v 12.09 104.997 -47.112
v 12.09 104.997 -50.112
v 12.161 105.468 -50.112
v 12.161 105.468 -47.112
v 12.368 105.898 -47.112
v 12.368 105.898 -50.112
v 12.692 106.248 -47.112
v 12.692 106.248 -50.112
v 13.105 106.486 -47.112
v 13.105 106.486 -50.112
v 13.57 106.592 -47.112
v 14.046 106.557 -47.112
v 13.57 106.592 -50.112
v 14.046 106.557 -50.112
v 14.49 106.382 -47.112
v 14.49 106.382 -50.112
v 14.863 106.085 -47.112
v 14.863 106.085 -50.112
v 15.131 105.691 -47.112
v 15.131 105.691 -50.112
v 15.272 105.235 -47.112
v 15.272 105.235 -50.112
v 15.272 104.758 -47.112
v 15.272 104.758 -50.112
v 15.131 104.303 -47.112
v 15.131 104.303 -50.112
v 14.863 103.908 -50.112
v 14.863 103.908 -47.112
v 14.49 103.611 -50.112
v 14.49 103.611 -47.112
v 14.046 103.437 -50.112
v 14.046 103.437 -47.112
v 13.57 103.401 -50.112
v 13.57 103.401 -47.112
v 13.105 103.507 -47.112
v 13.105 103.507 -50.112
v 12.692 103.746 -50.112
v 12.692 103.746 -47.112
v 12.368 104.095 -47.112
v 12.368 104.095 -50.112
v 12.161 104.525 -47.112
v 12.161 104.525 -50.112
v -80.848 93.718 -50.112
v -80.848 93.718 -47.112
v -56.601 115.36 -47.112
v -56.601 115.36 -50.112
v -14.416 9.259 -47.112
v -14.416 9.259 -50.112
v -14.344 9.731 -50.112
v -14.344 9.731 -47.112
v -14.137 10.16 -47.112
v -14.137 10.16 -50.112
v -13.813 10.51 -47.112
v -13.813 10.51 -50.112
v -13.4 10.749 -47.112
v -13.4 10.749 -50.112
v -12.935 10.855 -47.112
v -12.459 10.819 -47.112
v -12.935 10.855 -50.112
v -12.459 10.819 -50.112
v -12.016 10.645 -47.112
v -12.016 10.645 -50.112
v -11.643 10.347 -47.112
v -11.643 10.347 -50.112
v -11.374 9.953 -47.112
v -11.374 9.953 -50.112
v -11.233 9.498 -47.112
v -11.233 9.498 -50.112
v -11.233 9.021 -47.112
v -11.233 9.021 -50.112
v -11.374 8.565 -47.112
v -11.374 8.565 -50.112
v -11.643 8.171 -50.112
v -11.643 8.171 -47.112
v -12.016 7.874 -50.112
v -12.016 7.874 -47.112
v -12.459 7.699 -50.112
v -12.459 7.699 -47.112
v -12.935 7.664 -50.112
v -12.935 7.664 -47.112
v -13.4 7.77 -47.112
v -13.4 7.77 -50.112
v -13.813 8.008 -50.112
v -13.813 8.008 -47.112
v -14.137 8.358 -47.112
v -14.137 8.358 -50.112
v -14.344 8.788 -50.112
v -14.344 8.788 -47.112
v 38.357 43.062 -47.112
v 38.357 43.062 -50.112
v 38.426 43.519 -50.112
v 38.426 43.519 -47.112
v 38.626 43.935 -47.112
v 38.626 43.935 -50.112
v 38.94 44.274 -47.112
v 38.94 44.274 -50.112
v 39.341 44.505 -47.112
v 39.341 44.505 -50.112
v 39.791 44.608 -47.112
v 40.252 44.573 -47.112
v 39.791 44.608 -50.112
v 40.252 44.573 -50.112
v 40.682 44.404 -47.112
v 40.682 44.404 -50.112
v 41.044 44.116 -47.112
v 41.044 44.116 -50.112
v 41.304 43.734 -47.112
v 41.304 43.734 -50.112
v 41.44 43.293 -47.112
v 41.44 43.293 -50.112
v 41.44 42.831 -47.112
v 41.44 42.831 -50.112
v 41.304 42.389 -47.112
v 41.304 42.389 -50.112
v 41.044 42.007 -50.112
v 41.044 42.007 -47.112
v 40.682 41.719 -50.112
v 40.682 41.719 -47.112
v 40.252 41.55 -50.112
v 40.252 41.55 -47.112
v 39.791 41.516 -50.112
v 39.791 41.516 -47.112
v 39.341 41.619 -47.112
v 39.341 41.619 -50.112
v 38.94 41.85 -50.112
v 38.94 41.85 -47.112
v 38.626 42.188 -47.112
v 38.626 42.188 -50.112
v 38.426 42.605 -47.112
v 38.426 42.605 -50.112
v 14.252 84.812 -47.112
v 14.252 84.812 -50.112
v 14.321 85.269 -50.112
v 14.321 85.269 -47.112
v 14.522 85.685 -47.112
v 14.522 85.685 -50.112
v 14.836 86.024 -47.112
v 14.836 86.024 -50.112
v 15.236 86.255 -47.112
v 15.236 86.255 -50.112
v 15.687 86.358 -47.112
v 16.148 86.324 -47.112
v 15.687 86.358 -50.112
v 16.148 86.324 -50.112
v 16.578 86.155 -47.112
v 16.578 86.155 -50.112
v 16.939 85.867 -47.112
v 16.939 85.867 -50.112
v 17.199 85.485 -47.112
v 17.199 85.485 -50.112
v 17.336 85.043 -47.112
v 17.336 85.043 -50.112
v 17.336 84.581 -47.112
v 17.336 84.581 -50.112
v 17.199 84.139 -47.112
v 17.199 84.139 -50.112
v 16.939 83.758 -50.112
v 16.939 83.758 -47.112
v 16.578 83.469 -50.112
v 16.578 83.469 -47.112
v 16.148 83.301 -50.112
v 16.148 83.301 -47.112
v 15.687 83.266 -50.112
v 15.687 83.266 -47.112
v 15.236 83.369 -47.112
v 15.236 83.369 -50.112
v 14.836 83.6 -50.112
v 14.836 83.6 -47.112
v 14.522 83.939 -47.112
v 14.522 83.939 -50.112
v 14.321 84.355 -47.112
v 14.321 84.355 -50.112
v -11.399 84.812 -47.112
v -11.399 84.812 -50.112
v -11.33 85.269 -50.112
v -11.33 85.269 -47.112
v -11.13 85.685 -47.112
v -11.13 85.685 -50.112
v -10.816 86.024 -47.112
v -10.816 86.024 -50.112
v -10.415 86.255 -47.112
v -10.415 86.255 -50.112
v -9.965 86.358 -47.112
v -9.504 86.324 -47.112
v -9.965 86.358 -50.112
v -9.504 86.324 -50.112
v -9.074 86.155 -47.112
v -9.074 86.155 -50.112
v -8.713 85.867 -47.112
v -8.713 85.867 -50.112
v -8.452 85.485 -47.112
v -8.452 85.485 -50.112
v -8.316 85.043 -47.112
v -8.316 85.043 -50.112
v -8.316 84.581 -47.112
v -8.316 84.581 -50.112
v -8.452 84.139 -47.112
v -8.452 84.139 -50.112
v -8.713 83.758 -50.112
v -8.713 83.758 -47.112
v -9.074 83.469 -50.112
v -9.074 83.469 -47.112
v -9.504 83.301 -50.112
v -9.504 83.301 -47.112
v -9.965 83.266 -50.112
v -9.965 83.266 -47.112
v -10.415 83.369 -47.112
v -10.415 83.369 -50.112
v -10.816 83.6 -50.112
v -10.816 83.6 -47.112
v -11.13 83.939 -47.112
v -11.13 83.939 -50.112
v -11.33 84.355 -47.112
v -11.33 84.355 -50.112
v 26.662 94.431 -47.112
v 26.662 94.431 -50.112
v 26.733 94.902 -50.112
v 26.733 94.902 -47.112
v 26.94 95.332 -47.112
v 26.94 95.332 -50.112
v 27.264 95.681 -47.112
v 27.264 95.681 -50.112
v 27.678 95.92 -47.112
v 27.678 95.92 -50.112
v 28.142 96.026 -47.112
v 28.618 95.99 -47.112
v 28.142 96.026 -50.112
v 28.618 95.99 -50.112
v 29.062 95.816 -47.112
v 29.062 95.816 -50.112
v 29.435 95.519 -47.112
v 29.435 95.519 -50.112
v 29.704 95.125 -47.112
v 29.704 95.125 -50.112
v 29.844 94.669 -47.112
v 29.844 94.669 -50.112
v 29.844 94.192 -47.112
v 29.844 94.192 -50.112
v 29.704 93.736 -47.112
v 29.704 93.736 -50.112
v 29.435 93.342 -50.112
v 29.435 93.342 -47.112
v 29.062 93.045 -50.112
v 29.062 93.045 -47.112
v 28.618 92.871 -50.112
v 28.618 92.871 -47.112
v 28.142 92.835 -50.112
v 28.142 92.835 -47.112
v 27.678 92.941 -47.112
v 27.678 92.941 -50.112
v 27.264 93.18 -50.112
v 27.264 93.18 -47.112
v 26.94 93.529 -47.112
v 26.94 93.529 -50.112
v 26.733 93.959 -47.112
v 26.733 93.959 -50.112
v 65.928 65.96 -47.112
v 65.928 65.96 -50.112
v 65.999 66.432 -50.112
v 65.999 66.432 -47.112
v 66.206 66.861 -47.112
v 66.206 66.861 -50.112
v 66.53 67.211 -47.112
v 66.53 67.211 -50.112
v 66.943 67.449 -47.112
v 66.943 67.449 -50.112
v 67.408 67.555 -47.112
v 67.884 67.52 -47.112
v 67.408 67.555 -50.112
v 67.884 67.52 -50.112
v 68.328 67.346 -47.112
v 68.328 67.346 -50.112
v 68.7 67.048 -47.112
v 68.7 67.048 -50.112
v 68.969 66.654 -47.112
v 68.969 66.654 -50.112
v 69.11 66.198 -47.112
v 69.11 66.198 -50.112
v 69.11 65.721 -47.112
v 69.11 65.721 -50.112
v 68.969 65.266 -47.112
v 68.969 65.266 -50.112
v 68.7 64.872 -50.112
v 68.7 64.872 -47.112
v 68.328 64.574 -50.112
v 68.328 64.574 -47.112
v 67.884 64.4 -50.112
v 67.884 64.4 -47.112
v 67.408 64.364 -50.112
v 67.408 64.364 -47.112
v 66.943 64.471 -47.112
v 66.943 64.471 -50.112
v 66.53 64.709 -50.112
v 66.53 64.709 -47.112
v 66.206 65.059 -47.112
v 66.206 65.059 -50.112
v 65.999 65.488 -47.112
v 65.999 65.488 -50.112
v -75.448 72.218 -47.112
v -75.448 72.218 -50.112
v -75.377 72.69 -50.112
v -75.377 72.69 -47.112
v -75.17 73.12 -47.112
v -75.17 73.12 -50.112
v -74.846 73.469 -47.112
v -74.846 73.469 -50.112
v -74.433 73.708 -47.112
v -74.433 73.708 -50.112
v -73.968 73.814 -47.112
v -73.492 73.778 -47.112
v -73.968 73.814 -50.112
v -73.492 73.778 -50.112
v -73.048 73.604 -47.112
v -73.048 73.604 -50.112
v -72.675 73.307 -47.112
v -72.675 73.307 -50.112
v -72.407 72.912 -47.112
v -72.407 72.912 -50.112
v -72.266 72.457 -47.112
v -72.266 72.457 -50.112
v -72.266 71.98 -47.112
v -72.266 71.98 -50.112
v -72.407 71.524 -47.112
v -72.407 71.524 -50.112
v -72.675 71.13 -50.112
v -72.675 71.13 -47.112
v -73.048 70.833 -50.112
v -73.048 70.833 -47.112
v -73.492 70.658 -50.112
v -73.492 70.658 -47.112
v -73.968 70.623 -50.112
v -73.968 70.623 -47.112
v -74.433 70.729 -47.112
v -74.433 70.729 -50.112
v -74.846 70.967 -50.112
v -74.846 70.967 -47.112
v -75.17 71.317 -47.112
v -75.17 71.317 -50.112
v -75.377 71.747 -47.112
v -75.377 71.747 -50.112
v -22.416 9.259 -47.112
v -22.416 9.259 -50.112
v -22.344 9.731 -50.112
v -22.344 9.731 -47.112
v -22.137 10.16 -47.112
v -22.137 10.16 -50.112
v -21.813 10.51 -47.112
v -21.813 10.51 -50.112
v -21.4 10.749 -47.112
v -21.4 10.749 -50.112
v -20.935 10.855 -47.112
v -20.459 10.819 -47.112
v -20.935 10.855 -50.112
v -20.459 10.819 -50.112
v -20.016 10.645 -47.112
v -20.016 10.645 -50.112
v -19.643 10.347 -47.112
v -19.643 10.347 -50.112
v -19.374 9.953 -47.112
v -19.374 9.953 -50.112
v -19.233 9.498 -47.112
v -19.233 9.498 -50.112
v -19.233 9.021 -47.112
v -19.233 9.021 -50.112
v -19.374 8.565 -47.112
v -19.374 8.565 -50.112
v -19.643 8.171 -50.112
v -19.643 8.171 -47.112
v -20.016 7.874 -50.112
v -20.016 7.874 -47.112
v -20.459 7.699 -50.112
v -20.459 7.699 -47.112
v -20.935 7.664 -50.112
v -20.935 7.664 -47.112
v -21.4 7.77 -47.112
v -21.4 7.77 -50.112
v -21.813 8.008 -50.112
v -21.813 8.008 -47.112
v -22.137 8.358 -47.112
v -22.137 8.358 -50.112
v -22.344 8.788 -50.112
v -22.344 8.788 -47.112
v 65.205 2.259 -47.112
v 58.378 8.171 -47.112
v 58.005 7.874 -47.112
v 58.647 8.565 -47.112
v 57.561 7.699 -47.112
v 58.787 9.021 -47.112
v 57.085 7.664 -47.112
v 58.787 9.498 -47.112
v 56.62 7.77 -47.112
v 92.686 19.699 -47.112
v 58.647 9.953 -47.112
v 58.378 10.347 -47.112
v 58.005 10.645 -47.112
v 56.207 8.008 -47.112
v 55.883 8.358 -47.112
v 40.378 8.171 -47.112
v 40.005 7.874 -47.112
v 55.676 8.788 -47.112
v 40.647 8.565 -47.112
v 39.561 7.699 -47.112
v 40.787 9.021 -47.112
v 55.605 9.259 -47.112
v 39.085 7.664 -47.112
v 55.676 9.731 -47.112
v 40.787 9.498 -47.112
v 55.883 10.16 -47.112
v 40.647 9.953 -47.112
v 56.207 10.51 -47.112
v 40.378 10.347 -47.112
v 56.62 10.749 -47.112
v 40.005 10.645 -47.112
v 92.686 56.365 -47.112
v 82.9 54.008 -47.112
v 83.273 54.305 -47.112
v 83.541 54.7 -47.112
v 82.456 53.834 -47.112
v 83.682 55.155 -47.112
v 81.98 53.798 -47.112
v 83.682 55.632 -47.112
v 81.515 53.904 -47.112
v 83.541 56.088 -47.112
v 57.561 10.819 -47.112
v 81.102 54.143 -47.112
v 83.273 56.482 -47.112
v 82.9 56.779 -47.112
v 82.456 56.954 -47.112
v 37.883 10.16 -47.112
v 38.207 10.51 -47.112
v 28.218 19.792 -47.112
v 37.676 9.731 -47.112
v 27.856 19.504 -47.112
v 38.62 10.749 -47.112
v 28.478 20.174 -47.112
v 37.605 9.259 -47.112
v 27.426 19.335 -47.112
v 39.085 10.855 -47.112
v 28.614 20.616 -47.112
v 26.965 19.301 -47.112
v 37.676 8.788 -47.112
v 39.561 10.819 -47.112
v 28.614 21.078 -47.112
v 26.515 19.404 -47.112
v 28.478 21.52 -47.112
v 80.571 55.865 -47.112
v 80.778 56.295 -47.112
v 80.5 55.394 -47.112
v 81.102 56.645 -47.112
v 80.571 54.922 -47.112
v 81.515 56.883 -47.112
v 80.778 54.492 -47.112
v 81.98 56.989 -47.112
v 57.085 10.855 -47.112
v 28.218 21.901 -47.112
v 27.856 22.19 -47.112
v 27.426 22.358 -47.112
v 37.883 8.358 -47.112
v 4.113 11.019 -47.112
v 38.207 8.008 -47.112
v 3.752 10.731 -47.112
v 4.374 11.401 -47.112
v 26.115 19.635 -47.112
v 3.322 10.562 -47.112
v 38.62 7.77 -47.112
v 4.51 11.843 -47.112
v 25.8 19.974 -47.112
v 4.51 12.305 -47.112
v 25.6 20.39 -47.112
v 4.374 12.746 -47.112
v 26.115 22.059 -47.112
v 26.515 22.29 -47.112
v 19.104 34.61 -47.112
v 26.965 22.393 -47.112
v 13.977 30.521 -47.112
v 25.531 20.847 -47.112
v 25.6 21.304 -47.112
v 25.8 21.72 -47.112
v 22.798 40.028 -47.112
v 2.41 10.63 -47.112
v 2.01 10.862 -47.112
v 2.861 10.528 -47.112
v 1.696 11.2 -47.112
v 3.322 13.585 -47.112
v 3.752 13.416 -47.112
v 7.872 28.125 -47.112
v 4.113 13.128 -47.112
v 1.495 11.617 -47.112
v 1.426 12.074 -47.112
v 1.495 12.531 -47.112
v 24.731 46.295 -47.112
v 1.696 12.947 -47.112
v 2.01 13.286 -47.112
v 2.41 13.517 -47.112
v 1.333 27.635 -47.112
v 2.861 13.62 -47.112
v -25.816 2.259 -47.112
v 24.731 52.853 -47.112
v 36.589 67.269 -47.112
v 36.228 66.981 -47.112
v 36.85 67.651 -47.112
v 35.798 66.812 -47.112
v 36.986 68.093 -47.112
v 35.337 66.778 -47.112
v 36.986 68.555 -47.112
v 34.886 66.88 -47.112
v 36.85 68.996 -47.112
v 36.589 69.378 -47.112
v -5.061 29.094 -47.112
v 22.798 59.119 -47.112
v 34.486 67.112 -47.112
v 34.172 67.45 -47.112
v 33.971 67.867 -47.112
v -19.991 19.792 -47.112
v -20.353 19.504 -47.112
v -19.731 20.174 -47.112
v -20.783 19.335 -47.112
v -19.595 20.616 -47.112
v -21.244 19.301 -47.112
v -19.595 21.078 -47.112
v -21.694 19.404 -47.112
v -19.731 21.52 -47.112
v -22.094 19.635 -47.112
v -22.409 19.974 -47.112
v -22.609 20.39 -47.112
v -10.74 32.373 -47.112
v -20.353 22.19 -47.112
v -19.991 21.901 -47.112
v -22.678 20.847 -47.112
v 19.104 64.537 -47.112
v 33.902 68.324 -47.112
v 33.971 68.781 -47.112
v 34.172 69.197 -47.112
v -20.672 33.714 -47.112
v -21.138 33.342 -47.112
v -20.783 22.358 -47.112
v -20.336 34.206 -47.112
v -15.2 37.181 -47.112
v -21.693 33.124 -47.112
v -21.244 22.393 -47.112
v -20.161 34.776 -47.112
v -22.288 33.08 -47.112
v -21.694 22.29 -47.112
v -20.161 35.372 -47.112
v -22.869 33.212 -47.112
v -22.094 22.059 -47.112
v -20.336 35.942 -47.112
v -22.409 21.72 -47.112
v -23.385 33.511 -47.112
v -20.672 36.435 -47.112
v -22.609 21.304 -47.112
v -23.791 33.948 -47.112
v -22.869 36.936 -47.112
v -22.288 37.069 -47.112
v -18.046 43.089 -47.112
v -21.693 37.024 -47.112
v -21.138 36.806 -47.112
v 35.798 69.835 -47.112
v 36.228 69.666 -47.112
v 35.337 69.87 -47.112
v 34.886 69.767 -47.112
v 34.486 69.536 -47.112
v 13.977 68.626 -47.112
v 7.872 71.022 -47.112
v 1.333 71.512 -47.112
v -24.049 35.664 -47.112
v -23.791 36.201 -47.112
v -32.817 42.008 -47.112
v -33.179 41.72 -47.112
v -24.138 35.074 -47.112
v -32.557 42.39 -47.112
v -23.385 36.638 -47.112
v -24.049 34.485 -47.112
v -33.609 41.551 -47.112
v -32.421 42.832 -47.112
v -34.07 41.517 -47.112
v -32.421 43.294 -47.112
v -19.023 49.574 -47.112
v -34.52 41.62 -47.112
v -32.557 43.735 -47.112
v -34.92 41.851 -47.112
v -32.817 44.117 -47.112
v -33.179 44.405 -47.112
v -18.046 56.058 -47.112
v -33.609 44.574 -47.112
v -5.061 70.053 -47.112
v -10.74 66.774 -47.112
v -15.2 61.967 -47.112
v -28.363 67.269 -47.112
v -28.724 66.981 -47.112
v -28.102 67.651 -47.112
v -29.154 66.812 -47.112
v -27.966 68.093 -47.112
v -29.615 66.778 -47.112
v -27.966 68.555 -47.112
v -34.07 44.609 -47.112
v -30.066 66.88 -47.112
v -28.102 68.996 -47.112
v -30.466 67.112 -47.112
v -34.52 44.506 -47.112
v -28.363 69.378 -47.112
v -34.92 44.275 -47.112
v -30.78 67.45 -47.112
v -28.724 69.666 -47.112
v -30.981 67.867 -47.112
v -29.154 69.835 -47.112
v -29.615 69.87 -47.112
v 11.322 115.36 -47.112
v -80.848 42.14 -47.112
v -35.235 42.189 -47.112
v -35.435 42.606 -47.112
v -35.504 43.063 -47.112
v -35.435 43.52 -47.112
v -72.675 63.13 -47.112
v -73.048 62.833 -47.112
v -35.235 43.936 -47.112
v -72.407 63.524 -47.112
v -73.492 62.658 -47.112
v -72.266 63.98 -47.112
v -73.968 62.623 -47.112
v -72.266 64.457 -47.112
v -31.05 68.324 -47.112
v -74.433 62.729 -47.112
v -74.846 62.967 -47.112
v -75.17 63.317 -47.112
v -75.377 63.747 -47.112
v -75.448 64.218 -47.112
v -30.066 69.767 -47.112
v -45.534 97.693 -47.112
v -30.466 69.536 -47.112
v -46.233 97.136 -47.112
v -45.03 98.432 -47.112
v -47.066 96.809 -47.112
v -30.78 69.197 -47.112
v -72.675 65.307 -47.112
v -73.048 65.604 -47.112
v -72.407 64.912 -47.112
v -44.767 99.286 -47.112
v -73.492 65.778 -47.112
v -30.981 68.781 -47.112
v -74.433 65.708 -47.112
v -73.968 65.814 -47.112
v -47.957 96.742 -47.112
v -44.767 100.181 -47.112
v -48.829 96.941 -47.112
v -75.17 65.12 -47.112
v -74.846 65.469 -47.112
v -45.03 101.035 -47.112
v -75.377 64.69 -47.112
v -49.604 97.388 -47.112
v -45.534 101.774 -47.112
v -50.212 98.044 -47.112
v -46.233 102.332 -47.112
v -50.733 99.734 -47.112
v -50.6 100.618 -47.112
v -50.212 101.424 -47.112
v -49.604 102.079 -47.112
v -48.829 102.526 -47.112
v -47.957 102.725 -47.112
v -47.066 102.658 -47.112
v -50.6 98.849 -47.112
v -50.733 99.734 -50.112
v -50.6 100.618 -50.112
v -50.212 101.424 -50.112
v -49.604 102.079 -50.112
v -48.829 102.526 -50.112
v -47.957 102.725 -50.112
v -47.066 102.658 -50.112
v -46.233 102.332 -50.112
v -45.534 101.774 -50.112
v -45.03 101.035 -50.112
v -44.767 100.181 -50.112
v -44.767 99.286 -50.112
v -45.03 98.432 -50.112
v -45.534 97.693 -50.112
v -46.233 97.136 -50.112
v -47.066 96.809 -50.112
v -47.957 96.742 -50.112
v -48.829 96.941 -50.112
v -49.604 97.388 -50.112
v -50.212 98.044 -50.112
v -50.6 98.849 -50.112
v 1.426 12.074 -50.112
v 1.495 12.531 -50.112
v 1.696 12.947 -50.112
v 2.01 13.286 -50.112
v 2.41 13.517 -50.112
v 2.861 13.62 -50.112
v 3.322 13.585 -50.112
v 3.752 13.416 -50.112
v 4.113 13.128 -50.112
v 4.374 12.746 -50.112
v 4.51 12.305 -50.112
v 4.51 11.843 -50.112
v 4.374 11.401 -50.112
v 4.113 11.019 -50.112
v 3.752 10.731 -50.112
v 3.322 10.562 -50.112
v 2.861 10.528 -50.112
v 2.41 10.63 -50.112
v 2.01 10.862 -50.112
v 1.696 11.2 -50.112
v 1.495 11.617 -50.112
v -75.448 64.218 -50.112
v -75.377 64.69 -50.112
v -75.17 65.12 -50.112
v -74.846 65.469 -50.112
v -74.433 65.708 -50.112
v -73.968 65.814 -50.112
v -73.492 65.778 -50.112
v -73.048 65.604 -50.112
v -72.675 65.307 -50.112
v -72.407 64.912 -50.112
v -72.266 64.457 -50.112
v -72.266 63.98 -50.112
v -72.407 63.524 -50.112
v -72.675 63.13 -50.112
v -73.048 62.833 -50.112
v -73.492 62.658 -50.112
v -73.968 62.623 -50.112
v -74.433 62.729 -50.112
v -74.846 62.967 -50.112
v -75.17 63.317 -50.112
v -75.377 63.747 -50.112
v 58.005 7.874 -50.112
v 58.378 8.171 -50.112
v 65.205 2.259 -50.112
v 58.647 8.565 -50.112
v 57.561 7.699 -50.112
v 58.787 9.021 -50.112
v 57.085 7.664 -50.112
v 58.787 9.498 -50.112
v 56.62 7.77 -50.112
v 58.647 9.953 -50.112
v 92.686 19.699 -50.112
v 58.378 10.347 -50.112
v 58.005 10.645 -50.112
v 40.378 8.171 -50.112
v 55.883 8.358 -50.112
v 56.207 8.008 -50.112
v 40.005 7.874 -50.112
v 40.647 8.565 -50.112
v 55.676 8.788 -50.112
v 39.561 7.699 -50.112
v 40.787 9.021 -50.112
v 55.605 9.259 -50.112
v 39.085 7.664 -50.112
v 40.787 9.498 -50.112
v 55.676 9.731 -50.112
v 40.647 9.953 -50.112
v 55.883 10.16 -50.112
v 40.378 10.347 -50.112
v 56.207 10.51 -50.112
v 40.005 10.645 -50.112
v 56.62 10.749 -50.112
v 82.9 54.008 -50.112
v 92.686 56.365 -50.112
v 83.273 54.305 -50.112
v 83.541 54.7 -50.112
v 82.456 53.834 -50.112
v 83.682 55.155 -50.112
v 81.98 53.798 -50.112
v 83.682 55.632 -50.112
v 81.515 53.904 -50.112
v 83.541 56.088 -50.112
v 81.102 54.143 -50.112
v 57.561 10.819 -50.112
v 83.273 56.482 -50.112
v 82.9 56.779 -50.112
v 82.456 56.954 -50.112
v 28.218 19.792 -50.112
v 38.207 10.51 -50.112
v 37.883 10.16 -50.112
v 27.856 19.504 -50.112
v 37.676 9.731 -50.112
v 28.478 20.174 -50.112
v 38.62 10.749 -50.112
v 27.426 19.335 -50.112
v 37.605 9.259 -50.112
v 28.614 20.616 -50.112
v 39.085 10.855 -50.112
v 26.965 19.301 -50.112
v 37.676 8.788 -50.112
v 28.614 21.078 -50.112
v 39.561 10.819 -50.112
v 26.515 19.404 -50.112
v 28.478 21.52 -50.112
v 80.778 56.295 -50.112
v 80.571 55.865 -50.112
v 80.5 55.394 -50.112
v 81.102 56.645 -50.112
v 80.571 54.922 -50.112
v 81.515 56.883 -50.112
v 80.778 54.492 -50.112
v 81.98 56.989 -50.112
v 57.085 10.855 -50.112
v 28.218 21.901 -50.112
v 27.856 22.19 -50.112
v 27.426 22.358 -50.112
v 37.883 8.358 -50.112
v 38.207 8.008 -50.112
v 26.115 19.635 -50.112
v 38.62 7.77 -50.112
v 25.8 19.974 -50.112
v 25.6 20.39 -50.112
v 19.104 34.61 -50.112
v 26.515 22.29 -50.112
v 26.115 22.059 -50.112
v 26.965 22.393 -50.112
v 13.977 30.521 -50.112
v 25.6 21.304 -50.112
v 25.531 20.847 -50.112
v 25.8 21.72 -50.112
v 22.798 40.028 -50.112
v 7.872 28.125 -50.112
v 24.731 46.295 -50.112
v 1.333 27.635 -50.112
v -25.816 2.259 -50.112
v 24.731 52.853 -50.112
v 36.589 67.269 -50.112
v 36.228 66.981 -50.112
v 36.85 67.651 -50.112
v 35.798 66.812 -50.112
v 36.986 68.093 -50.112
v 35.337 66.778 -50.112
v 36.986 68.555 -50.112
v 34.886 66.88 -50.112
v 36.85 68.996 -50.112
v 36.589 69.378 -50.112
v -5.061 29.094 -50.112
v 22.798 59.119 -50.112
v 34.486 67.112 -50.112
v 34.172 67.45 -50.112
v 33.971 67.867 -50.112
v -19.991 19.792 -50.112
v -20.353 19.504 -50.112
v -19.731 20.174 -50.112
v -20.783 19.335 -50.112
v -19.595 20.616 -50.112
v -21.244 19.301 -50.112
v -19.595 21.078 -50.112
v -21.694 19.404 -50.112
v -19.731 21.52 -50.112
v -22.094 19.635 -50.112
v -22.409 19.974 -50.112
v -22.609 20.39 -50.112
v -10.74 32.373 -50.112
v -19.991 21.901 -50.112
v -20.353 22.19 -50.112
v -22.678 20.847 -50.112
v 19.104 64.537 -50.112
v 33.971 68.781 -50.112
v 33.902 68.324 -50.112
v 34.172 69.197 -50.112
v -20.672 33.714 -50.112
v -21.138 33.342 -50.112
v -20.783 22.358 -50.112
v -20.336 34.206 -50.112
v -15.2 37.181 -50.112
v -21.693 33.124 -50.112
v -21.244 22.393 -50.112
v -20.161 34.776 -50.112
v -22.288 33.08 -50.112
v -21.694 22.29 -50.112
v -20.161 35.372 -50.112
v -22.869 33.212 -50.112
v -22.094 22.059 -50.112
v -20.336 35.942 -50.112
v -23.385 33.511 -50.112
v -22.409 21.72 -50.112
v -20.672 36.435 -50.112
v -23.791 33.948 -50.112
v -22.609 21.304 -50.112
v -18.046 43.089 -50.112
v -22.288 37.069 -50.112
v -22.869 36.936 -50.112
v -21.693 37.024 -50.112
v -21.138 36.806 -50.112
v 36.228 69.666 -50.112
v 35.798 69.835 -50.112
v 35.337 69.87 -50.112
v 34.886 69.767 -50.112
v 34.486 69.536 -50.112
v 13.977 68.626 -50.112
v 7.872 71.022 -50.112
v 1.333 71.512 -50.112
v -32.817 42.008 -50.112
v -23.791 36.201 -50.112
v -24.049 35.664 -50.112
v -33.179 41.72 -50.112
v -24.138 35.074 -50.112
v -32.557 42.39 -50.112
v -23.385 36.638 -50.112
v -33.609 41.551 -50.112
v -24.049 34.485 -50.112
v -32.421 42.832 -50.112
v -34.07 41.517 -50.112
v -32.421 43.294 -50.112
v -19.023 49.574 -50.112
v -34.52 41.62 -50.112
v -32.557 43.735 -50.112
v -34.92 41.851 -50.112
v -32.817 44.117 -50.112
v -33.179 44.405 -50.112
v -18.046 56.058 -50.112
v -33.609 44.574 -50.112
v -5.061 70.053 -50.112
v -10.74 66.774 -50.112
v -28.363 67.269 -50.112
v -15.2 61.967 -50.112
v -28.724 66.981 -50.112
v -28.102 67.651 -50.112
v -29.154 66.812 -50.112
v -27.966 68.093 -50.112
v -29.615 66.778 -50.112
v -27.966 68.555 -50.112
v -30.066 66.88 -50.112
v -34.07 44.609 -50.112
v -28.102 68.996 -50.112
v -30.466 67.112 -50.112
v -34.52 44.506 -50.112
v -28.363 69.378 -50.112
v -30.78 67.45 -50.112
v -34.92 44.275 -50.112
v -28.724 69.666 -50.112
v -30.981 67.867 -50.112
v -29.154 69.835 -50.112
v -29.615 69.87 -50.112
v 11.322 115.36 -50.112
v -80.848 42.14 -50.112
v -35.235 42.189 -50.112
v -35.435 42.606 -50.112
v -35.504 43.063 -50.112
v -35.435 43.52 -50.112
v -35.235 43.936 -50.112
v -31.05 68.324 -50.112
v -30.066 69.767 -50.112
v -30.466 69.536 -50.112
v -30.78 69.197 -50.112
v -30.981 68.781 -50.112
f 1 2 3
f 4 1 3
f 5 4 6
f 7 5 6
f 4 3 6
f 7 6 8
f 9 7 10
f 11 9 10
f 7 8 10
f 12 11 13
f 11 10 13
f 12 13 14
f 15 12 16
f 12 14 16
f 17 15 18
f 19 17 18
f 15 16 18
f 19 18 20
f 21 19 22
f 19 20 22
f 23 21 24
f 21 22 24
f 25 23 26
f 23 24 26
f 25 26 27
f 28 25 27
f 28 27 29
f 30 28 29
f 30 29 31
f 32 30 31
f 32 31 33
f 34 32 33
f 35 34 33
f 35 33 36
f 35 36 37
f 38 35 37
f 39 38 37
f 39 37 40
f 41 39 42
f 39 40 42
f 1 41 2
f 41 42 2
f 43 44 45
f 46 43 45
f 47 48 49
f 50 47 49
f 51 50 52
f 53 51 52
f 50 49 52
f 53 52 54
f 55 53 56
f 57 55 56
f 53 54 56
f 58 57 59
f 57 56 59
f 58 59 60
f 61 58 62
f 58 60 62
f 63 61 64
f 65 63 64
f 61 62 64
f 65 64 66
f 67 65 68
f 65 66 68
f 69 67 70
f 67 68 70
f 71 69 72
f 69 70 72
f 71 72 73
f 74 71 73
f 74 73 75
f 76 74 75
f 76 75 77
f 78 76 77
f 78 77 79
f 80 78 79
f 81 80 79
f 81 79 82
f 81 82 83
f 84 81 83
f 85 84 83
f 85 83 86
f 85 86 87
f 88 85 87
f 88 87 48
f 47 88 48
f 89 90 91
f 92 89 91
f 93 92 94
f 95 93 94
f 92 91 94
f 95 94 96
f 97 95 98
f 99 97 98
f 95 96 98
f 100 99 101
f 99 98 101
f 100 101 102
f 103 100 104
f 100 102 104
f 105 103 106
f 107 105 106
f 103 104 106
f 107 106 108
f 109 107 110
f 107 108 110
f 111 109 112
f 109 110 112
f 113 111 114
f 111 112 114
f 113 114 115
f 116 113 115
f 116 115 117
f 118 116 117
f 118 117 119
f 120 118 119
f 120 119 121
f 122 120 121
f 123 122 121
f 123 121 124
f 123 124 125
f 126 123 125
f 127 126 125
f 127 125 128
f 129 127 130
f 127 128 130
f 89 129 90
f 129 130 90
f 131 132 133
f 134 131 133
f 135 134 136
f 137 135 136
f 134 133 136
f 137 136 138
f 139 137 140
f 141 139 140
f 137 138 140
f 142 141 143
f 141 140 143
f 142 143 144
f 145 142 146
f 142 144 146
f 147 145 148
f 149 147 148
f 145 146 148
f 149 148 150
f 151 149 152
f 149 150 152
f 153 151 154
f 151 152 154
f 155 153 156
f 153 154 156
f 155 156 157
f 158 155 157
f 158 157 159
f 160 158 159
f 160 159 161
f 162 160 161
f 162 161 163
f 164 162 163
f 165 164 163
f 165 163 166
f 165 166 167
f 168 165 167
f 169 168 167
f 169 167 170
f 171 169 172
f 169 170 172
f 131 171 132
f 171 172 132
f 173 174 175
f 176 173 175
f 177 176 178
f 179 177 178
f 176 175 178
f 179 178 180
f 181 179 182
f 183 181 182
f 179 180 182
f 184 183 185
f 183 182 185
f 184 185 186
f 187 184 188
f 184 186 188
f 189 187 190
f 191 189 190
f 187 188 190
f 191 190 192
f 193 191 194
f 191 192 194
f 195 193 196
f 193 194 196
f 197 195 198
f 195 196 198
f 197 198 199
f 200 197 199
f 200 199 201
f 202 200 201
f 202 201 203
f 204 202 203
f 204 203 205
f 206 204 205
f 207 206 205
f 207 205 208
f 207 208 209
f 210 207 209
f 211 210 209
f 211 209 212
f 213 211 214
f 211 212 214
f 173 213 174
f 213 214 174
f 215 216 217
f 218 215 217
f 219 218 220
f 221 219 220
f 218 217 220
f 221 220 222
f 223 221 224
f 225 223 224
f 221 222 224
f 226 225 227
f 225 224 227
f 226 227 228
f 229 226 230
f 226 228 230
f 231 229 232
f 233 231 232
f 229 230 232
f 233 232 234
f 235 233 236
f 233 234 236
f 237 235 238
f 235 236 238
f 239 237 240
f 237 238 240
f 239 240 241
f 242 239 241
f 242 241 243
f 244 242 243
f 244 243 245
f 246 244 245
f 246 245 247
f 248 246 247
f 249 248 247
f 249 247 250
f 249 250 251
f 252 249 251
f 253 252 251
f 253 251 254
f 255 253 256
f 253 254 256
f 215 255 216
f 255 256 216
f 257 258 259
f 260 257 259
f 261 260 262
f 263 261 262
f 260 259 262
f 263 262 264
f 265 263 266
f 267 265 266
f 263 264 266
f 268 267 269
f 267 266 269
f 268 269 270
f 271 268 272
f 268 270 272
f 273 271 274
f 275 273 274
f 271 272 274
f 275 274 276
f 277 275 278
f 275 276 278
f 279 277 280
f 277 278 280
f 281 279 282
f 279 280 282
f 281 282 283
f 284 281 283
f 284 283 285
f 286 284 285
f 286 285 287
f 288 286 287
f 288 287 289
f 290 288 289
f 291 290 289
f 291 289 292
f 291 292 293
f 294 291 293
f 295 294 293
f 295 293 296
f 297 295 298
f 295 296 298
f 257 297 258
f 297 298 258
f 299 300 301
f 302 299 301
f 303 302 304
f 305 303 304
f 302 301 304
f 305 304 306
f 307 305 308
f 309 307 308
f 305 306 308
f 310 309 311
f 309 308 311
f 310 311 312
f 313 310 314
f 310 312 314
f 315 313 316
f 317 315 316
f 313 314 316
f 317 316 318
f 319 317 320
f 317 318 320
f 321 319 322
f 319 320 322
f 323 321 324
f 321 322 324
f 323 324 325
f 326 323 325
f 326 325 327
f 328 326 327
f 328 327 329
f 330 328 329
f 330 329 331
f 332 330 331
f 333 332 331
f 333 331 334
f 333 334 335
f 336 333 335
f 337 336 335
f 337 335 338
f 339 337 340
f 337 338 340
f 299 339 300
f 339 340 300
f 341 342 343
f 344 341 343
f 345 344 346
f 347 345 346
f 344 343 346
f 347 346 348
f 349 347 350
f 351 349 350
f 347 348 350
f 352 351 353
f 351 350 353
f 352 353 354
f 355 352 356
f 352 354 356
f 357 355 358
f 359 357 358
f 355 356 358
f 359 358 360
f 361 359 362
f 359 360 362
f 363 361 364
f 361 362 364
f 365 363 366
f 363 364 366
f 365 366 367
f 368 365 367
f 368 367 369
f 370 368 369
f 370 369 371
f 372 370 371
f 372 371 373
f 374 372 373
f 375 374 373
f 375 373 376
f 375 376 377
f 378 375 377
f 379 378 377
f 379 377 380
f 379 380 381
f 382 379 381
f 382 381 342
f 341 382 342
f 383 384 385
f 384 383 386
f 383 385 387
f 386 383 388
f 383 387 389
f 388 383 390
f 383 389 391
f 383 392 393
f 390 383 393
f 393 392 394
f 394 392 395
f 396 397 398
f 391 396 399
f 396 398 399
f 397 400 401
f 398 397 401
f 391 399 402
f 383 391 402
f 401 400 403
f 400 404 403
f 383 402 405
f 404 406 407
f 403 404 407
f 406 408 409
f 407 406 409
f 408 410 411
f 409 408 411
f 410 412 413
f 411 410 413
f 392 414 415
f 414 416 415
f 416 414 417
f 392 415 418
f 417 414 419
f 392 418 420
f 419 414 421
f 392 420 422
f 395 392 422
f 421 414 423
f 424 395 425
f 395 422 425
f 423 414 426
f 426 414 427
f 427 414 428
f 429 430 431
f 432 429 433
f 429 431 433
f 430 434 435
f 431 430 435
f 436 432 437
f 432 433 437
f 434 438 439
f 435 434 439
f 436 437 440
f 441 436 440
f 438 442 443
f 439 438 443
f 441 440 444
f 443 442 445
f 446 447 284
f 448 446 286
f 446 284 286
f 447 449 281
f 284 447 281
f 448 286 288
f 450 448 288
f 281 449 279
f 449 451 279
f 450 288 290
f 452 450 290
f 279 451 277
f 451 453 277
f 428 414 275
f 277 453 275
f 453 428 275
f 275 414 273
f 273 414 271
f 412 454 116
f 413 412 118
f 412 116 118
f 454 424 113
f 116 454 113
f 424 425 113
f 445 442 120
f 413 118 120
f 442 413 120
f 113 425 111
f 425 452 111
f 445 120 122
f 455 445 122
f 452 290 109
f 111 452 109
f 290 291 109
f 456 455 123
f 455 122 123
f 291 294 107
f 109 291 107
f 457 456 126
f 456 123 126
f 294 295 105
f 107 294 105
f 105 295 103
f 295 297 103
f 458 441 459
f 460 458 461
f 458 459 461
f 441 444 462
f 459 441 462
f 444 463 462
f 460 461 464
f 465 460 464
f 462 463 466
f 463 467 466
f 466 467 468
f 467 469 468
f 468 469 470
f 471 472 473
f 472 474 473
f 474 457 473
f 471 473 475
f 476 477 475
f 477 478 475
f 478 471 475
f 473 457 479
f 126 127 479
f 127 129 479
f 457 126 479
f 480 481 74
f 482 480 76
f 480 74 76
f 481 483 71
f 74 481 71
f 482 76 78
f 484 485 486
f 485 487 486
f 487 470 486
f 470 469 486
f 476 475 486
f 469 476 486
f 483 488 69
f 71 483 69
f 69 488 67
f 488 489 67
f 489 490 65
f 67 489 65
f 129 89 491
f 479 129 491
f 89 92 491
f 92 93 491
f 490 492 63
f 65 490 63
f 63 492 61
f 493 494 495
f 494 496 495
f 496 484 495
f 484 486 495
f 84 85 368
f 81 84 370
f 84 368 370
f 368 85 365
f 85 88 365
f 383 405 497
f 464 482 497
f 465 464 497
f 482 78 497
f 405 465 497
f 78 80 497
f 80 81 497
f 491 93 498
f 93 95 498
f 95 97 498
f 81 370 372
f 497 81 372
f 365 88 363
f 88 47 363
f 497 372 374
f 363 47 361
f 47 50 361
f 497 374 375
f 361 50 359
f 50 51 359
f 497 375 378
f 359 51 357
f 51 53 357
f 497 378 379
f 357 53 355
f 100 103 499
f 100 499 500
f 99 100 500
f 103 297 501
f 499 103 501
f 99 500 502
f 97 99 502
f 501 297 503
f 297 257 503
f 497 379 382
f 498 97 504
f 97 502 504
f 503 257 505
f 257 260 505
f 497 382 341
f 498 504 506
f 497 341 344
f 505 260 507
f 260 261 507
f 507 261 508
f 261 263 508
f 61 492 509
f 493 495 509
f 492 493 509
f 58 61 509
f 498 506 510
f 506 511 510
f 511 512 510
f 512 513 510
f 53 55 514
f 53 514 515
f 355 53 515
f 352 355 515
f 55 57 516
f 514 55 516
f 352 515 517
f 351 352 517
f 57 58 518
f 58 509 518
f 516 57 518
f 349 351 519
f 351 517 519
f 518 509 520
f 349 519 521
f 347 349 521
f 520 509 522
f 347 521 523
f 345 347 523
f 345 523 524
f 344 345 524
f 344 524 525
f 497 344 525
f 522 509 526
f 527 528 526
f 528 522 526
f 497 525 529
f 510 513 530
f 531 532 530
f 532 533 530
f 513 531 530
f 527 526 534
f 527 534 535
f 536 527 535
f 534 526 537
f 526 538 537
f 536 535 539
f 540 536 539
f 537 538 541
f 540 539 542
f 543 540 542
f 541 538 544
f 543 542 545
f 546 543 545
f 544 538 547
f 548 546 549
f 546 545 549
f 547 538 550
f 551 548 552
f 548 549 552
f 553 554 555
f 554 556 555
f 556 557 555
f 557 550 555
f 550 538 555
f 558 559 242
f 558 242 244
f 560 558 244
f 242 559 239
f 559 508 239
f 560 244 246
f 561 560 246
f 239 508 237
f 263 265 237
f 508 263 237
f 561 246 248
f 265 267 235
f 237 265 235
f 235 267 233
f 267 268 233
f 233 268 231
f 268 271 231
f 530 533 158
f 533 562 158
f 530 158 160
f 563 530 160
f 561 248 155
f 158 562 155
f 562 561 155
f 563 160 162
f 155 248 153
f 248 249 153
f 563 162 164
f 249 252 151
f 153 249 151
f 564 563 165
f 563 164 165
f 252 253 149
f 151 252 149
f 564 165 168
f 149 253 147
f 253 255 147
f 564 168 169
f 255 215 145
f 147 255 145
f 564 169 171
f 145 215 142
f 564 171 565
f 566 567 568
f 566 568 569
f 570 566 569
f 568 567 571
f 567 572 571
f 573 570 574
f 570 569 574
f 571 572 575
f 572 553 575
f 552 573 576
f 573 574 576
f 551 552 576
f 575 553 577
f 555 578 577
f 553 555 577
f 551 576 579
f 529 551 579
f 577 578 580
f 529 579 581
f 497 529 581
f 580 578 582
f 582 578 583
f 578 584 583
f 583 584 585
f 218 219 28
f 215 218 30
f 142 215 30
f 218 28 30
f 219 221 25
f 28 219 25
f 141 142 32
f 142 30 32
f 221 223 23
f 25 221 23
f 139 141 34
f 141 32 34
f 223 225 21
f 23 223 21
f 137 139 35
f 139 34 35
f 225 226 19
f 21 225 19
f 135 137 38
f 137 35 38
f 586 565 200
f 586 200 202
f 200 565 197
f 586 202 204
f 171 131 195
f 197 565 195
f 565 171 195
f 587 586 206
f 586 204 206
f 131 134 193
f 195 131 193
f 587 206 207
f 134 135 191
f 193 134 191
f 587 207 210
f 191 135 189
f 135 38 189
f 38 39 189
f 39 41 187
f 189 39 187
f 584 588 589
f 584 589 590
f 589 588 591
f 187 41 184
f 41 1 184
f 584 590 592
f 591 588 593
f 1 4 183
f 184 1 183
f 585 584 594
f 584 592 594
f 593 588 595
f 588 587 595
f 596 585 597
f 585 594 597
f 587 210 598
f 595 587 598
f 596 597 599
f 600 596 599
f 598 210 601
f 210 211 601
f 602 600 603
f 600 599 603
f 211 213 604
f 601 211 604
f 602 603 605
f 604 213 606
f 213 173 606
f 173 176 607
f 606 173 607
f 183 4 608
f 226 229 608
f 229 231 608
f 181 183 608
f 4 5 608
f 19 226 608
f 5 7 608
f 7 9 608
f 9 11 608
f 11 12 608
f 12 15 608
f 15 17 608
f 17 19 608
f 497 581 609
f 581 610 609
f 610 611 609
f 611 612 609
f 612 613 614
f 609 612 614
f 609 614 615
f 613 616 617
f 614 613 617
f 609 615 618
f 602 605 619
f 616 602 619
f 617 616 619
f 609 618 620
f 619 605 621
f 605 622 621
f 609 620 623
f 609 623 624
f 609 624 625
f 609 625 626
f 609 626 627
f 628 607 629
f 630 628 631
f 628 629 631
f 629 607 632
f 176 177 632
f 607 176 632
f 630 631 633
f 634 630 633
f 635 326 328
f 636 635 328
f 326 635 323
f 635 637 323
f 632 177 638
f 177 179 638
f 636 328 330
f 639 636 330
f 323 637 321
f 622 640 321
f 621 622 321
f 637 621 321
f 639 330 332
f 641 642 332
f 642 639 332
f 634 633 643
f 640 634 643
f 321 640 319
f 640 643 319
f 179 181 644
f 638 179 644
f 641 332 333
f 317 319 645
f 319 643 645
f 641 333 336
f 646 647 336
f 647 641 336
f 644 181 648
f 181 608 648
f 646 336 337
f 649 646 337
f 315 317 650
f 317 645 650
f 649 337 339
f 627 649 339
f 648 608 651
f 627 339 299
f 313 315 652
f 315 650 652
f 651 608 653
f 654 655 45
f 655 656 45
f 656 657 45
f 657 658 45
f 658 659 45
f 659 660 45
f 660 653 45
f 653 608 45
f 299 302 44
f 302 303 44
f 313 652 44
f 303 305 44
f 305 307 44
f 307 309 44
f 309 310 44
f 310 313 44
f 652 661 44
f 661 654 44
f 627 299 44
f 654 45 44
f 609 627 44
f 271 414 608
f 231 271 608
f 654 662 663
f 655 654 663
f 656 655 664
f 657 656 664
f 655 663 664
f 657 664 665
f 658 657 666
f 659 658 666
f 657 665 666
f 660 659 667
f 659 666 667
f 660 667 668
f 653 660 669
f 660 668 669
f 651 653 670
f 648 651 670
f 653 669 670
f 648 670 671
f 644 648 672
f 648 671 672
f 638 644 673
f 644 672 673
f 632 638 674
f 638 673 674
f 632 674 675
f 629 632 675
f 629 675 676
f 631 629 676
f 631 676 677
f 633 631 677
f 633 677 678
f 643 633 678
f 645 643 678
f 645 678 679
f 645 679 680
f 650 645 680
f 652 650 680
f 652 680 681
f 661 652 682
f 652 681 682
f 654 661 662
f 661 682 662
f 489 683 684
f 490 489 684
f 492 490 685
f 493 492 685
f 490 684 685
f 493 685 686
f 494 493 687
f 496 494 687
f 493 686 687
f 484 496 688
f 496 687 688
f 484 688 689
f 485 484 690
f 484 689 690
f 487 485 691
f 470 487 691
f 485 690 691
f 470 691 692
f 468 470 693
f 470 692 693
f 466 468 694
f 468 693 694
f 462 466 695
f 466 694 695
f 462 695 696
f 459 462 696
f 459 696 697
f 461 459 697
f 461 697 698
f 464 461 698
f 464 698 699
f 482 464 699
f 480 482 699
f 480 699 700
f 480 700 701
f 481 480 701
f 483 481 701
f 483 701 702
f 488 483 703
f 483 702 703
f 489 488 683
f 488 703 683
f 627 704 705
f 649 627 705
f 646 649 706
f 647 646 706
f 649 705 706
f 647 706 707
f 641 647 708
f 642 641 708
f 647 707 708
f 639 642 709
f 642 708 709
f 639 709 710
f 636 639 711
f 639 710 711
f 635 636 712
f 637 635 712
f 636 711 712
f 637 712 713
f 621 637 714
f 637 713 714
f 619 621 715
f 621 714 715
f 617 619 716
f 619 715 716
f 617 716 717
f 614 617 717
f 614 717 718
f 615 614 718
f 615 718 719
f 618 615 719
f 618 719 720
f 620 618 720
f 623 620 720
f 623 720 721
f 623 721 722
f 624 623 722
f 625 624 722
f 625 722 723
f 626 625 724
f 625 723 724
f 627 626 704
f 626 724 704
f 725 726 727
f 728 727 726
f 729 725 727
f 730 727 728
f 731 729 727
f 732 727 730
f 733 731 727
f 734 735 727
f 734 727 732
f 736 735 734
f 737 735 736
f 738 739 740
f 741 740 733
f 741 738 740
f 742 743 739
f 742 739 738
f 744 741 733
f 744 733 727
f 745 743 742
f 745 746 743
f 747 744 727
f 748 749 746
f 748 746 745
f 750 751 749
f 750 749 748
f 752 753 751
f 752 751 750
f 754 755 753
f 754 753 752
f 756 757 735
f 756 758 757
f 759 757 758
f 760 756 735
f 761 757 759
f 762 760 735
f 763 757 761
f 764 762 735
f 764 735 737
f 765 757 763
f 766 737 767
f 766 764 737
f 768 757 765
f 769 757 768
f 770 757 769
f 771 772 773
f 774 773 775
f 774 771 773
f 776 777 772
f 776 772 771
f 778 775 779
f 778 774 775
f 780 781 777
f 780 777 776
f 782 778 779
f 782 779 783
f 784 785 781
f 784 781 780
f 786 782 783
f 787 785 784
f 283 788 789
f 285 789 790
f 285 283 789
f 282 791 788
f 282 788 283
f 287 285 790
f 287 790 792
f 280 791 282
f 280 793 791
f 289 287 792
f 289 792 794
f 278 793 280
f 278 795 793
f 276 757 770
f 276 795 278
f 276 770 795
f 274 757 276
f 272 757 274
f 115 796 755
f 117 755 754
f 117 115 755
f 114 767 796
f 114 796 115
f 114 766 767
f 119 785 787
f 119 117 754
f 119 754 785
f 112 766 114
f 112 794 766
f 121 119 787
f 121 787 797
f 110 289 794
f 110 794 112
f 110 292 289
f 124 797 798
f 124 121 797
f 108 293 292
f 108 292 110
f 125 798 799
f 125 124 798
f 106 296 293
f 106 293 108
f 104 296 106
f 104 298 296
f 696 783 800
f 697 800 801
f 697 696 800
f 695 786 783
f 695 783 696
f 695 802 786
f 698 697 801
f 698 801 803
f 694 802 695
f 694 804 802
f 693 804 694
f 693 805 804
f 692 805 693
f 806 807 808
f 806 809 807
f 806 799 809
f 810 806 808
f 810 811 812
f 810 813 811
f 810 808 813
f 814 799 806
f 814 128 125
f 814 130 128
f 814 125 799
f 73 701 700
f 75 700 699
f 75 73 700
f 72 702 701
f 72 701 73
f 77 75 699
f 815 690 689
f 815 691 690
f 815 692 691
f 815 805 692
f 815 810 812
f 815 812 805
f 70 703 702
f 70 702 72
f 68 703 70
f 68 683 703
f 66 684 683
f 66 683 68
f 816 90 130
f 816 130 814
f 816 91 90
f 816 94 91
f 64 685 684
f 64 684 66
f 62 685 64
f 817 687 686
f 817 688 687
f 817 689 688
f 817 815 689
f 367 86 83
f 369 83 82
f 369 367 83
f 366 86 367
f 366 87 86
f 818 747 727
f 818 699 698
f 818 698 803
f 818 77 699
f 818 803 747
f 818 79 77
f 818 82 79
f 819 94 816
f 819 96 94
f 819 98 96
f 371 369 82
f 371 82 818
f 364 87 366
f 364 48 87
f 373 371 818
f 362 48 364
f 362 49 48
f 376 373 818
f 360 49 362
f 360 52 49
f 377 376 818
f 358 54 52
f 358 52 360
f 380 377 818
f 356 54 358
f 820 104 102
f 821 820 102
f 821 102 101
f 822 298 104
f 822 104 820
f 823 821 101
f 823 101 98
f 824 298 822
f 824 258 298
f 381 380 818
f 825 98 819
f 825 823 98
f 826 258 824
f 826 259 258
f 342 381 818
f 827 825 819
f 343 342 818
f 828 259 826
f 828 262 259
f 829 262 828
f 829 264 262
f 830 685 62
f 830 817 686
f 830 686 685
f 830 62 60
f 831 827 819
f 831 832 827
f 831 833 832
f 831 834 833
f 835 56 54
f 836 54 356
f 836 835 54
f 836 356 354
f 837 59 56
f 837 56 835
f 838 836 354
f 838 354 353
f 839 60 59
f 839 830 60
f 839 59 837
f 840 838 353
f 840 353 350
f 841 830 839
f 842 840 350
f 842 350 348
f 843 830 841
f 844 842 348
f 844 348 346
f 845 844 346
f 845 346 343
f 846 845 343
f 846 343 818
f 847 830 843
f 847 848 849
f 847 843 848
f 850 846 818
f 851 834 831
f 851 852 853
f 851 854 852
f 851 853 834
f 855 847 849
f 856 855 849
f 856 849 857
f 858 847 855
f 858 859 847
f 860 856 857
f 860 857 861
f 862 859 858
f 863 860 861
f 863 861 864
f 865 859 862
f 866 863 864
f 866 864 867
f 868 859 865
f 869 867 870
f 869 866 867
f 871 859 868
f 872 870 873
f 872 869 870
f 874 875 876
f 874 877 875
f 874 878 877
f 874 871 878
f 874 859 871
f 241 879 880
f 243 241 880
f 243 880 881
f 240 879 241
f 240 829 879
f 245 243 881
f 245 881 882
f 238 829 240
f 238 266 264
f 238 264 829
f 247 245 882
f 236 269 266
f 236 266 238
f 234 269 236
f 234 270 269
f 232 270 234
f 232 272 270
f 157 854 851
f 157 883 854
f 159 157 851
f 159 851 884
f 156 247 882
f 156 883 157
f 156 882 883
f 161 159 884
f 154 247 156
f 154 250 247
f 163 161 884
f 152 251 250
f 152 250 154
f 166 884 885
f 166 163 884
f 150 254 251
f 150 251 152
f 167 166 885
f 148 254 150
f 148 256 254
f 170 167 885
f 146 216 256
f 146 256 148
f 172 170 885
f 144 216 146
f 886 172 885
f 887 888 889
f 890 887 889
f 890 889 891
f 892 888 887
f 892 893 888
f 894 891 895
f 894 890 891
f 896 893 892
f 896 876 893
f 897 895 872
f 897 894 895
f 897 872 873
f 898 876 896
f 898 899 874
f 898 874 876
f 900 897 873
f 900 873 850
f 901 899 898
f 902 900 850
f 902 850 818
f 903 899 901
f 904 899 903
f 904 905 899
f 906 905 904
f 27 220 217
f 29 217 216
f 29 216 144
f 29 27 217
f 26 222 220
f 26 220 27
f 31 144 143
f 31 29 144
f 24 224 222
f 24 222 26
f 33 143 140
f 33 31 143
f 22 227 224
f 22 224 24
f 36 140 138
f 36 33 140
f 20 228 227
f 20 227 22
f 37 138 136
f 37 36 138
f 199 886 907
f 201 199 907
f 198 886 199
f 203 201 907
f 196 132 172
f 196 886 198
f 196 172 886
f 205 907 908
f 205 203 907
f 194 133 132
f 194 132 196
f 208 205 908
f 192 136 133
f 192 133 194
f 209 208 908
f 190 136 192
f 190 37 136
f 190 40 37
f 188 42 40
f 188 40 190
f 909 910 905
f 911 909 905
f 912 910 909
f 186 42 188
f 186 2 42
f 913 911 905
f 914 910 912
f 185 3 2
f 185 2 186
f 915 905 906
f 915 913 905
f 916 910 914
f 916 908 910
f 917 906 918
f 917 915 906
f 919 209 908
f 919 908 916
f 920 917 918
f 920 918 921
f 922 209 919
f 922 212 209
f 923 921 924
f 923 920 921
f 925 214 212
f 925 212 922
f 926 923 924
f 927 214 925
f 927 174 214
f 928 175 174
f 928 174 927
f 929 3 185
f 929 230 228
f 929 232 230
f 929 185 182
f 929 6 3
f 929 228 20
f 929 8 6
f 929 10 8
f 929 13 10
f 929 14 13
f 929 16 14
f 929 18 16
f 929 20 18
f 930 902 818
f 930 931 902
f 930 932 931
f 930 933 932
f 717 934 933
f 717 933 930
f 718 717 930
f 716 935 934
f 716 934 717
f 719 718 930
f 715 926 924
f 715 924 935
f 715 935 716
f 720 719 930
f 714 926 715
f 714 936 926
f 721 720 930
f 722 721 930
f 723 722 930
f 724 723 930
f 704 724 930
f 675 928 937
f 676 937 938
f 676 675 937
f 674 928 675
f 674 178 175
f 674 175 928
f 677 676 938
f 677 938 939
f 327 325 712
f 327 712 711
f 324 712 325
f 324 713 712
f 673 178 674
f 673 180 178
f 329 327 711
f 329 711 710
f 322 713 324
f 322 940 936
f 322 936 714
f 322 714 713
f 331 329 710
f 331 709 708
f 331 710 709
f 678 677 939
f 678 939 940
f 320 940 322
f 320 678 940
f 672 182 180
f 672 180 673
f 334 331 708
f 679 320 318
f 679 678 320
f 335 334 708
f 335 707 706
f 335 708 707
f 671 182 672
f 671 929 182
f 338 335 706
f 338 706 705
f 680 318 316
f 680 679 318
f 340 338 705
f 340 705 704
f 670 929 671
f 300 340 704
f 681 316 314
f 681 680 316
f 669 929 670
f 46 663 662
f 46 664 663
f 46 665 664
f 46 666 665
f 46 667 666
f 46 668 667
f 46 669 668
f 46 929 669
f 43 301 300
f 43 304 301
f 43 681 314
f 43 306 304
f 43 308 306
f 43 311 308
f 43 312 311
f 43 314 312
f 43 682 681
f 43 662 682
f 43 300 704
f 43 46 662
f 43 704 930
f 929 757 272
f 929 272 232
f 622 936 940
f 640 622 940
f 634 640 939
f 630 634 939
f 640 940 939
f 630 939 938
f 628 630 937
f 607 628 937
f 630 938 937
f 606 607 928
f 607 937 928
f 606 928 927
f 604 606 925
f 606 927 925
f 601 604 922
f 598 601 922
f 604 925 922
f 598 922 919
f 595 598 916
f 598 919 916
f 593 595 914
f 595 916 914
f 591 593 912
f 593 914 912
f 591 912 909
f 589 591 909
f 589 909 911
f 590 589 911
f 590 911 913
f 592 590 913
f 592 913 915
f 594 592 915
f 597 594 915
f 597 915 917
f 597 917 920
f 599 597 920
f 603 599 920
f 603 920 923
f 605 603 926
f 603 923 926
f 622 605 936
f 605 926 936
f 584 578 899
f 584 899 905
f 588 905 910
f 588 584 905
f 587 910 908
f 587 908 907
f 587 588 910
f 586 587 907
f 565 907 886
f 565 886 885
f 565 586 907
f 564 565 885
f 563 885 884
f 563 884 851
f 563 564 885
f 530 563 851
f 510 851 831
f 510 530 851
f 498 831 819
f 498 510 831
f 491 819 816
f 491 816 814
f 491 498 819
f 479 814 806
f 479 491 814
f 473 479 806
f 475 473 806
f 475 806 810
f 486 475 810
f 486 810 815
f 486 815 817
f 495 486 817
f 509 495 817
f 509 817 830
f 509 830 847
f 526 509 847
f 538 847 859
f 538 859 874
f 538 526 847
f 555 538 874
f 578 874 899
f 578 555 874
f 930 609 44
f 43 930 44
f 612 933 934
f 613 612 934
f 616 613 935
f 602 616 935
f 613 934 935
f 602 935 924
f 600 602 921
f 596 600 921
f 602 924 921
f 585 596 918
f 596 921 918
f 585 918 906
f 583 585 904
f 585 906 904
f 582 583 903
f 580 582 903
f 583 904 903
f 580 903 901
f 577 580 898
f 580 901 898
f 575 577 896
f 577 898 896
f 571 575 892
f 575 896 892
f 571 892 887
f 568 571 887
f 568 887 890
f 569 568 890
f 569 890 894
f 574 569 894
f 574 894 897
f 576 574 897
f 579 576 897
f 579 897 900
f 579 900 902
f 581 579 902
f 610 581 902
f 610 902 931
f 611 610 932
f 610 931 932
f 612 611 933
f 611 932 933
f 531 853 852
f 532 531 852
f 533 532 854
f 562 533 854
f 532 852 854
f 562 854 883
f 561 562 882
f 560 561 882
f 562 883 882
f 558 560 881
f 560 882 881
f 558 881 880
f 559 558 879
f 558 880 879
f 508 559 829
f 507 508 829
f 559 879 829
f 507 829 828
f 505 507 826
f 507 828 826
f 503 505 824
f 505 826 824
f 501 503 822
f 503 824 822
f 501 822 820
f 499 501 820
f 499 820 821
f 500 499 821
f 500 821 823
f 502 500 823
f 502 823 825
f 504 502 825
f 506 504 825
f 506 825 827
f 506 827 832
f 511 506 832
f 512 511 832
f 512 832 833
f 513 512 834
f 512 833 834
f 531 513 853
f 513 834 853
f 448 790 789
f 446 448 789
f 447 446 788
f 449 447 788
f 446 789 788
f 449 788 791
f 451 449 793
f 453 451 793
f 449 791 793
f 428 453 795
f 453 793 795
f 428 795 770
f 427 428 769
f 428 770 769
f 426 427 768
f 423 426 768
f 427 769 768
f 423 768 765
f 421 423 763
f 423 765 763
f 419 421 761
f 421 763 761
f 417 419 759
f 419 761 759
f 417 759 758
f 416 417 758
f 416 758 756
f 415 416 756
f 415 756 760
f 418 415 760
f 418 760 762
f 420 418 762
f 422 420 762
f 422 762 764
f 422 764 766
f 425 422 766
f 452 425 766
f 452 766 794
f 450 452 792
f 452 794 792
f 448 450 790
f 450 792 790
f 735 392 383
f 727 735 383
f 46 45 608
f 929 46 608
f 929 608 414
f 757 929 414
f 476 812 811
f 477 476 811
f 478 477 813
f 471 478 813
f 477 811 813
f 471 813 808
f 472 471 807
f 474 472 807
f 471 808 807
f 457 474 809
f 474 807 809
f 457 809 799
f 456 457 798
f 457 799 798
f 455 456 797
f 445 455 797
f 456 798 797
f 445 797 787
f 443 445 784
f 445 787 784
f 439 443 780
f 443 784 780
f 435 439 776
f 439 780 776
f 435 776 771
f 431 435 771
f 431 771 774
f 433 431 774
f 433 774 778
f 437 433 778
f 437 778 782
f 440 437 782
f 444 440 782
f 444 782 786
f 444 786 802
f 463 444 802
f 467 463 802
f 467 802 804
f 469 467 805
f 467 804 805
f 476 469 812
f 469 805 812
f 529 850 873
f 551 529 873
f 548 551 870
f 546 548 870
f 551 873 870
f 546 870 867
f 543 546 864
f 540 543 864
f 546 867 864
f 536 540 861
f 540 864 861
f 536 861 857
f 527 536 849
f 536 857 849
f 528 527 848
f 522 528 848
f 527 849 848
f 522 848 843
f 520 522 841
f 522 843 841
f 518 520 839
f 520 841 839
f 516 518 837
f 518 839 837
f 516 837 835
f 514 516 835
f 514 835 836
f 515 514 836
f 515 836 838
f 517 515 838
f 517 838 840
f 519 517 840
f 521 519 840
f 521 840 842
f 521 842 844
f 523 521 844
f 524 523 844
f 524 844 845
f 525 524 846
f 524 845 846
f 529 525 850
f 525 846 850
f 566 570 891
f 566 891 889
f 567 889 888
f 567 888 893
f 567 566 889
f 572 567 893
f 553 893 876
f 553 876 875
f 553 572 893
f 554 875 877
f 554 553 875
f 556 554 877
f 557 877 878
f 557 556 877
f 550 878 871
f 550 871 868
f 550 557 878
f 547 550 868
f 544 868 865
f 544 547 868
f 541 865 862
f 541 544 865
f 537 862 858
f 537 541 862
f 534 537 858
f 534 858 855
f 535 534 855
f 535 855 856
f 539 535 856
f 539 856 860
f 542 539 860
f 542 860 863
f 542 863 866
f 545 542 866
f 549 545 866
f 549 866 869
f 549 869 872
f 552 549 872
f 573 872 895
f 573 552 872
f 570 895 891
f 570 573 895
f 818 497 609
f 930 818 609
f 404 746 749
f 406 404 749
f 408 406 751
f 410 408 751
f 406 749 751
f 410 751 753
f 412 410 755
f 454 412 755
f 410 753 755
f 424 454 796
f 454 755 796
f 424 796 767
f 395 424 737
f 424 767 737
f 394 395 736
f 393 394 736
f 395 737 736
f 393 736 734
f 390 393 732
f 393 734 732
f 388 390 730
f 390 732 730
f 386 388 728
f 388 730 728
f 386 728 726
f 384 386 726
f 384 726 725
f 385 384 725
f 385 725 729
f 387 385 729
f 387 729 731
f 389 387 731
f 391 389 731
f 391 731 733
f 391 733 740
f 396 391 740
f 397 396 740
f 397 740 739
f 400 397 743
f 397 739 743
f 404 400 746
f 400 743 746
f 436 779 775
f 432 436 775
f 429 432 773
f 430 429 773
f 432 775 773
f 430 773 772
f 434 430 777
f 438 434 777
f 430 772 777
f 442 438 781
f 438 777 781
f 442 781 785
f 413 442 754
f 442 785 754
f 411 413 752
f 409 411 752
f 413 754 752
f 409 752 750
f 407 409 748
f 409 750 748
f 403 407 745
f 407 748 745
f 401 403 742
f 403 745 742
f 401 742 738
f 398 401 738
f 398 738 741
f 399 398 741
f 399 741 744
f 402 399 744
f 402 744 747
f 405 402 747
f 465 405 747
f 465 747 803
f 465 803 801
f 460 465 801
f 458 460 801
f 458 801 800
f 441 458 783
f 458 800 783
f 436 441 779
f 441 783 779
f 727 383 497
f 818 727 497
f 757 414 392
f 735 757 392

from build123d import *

# Parameters (mm, degrees)
SKETCH_1_R          = 22
SKETCH_1_R_2        = 2
EXTRUDE_1_DEPTH     = 3
SKETCH_2_R          = 3
CUT_EXTRUDE_1_DEPTH = 3
SKETCH_4_R          = 1.550336064
SKETCH_4_R_2        = 1.6
CUT_EXTRUDE_2_DEPTH = 3
SKETCH_5_R          = 1.6
CUT_EXTRUDE_3_DEPTH = 3
SKETCH_6_R          = 1.6
CUT_EXTRUDE_4_DEPTH = 3
SKETCH_7_R          = 1.6
CUT_EXTRUDE_7_DEPTH = 149.01191544


with BuildPart() as part:
    # 草图1 → 凸台-拉伸1 (new body)
    with BuildSketch(Plane(origin=(0, 0, -47.111716595), x_dir=(-1, 0, 0), z_dir=(0, 0, -1))):
        Polygon((-65.204960674, 2.259155248), (25.815510263, 2.259155248), (80.848097232, 42.139739941), (80.848097232, 93.718256609), (56.600680459, 115.359857107), (-11.322058774, 115.359857107), (-92.685654124, 56.364707651), (-92.685654124, 19.698826092), align=None)
        with Locations((-2.976767055, 49.573611164)):
            Circle(SKETCH_1_R, mode=Mode.SUBTRACT)
        with Locations((22.138317691, 35.074213997)):
            Circle(SKETCH_1_R_2, mode=Mode.SUBTRACT)
    extrude(amount=EXTRUDE_1_DEPTH)

    # 草图2 → 切除-拉伸1 (cut)
    with BuildSketch(Plane(origin=(0, 0, -50.111716595), x_dir=(-1, 0, 0), z_dir=(0, 0, -1))):
        with Locations((47.733232945, 99.733611164)):
            Circle(SKETCH_2_R)
    extrude(amount=-CUT_EXTRUDE_1_DEPTH, mode=Mode.SUBTRACT)

    # 草图4 → 切除-拉伸2 (cut)
    with BuildSketch(Plane(origin=(0, 0, -50.111716595), x_dir=(-1, 0, 0), z_dir=(0, 0, -1))):
        with Locations((21.127768308, 20.846944547)):
            Circle(SKETCH_4_R)
        with Locations((-2.976767055, 12.073611164)):
            Circle(SKETCH_4_R)
        with Locations((-27.081302418, 20.846944547)):
            Circle(SKETCH_4_R)
        with Locations((-39.907057793, 43.061804502)):
            Circle(SKETCH_4_R)
        with Locations((-35.452719697, 68.323611164)):
            Circle(SKETCH_4_R)
        with Locations((-15.802522429, 84.812084444)):
            Circle(SKETCH_4_R)
        with Locations((9.84898832, 84.812084444)):
            Circle(SKETCH_4_R)
        with Locations((29.499185587, 68.323611164)):
            Circle(SKETCH_4_R)
        with Locations((33.953694149, 43.062771337)):
            Circle(SKETCH_4_R)
        with Locations((-57.204960674, 9.259155248)):
            Circle(SKETCH_4_R_2)
        with Locations((-39.204960674, 9.259155248)):
            Circle(SKETCH_4_R_2)
    extrude(amount=-CUT_EXTRUDE_2_DEPTH, mode=Mode.SUBTRACT)

    # 草图5 → 切除-拉伸3 (cut)
    with BuildSketch(Plane(origin=(0, 0, -50.111716595), x_dir=(-1, 0, 0), z_dir=(0, 0, -1))):
        with Locations((73.848097232, 72.218256609)):
            Circle(SKETCH_5_R)
        with Locations((73.848097232, 64.218256609)):
            Circle(SKETCH_5_R)
    extrude(amount=-CUT_EXTRUDE_3_DEPTH, mode=Mode.SUBTRACT)

    # 草图6 → 切除-拉伸4 (cut)
    with BuildSketch(Plane(origin=(0, 0, -50.111716595), x_dir=(-1, 0, 0), z_dir=(0, 0, -1))):
        with Locations((-82.099946385, 55.393733062)):
            Circle(SKETCH_6_R)
        with Locations((-67.527515299, 65.959917436)):
            Circle(SKETCH_6_R)
        with Locations((-28.262054197, 94.430534254)):
            Circle(SKETCH_6_R)
        with Locations((-13.689623111, 104.996718629)):
            Circle(SKETCH_6_R)
    extrude(amount=-CUT_EXTRUDE_4_DEPTH, mode=Mode.SUBTRACT)

    # 草图7 → 切除-拉伸7 (cut, through all)
    with BuildSketch(Plane(origin=(0, 0, -50.111716595), x_dir=(-1, 0, 0), z_dir=(0, 0, -1))):
        with Locations((12.815510263, 9.259155248)):
            Circle(SKETCH_7_R)
        with Locations((20.815510263, 9.259155248)):
            Circle(SKETCH_7_R)
    extrude(amount=-CUT_EXTRUDE_7_DEPTH, mode=Mode.SUBTRACT)


solid = part.part
